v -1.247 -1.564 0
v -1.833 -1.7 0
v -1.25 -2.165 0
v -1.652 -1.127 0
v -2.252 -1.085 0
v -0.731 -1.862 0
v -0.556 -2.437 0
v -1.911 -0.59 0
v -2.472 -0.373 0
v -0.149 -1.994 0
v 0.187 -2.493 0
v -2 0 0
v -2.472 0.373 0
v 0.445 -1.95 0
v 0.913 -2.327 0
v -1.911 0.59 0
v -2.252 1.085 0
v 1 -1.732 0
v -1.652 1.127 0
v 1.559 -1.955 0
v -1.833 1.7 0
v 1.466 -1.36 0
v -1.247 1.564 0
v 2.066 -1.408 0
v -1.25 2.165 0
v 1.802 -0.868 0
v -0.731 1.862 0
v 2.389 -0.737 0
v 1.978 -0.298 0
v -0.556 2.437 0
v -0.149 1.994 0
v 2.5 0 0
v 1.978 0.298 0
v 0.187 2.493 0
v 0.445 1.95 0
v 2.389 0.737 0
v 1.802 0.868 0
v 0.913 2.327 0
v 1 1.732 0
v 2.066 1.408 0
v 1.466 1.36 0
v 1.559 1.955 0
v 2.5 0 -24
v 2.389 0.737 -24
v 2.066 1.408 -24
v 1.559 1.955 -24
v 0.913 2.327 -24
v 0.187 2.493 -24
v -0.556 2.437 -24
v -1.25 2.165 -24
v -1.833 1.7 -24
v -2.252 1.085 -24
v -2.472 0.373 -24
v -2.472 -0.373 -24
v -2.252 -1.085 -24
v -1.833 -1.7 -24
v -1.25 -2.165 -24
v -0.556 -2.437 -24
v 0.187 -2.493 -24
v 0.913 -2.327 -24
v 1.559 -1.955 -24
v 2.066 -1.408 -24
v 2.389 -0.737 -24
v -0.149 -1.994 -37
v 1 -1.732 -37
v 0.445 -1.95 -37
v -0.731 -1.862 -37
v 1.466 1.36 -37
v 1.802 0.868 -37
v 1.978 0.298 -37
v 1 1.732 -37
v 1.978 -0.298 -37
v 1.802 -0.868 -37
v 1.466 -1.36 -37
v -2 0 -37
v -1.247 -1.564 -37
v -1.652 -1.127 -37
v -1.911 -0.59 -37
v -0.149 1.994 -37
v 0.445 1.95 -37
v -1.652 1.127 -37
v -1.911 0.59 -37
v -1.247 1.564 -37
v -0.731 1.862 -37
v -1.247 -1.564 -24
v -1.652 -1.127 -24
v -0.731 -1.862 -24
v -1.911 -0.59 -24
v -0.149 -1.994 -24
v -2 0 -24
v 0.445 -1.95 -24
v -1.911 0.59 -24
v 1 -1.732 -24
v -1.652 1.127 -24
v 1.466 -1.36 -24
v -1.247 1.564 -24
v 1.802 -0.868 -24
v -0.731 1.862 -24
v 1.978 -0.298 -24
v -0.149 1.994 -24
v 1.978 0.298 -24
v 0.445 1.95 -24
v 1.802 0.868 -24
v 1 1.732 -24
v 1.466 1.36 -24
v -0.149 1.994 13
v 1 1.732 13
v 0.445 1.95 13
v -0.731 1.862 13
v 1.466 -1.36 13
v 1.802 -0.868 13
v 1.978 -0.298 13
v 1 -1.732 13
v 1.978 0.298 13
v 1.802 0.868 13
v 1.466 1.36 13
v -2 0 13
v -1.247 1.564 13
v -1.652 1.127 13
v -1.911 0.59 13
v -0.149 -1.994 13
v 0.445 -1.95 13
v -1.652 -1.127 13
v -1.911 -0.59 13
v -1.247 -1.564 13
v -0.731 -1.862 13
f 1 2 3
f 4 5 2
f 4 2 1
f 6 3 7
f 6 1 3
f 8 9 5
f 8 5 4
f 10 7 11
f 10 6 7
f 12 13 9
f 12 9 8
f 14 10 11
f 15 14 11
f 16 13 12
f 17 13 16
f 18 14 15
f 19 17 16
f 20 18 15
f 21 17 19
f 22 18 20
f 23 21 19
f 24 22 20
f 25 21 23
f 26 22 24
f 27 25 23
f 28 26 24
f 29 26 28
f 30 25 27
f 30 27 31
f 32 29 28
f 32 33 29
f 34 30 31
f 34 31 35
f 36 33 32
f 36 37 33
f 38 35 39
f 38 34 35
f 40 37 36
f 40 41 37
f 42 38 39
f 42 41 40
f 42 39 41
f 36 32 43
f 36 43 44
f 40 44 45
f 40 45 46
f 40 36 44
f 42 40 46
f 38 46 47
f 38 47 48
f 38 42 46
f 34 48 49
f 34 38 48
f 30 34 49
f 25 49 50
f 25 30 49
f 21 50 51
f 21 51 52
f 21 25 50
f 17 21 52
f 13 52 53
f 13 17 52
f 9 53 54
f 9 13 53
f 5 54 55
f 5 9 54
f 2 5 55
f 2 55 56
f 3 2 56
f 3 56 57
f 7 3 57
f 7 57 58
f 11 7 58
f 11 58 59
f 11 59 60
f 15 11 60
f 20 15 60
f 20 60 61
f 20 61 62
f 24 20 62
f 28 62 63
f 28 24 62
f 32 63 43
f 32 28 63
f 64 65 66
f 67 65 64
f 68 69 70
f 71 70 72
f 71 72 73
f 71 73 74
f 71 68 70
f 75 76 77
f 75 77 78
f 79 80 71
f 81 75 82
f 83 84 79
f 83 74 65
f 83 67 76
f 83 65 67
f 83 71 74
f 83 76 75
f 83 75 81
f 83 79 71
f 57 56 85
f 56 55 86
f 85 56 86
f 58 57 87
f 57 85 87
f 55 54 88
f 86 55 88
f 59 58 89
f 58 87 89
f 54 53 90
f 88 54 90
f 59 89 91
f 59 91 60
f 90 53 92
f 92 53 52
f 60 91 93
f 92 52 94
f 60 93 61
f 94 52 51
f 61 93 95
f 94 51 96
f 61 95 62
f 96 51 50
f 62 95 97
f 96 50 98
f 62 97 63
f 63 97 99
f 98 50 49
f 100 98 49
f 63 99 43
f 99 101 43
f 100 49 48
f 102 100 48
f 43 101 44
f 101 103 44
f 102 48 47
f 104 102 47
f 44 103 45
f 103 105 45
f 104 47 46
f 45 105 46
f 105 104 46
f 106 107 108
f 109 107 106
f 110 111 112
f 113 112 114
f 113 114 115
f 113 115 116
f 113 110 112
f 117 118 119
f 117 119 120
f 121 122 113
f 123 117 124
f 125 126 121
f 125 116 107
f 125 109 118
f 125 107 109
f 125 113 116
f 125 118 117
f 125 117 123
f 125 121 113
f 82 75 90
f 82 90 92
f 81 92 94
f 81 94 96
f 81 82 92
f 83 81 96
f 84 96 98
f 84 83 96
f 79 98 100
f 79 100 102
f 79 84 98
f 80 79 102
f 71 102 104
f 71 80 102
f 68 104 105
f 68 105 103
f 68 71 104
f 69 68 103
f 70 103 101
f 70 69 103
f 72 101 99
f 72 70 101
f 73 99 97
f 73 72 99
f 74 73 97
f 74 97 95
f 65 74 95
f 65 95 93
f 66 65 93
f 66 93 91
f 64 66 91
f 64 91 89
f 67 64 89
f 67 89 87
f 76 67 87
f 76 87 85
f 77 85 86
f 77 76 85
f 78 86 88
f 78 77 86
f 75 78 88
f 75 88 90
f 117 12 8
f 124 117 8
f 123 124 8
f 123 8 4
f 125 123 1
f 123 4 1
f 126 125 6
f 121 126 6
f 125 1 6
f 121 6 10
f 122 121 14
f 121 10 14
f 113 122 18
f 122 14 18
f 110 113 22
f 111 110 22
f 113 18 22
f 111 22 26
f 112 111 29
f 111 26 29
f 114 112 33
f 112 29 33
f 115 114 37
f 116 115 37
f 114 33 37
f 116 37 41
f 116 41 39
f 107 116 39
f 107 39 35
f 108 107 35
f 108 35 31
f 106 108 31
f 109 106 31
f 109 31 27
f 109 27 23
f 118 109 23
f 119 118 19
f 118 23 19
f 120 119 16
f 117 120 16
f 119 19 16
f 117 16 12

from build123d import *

# Parameters (mm, degrees)
ESQUISSE1_R        = 2.5
BOSS_EXTRU_1_DEPTH = 24
ESQUISSE2_R        = 2
BOSS_EXTRU_2_DEPTH = 13
BOSS_EXTRU_3_START = 13
ESQUISSE3_R        = 2
BOSS_EXTRU_3_DEPTH = 13


with BuildPart() as part:
    # Esquisse1 → Boss.-Extru.1 (new body)
    with BuildSketch(Plane.XY):
        Circle(ESQUISSE1_R)
    extrude(amount=-BOSS_EXTRU_1_DEPTH)

    # Esquisse2 → Boss.-Extru.2 (add)
    with BuildSketch(Plane.XY):
        with Locations(Location((0, 0, 0), (0, 0, 180))):
            Circle(ESQUISSE2_R)
    extrude(amount=BOSS_EXTRU_2_DEPTH)

    # Esquisse3 → Boss.-Extru.3 (add)
    with BuildSketch(Plane(origin=(0, 0, -24), x_dir=(-1, 0, 0), z_dir=(0, 0, -1)).offset(BOSS_EXTRU_3_START)):
        Circle(ESQUISSE3_R)
    extrude(amount=-BOSS_EXTRU_3_DEPTH)


solid = part.part
